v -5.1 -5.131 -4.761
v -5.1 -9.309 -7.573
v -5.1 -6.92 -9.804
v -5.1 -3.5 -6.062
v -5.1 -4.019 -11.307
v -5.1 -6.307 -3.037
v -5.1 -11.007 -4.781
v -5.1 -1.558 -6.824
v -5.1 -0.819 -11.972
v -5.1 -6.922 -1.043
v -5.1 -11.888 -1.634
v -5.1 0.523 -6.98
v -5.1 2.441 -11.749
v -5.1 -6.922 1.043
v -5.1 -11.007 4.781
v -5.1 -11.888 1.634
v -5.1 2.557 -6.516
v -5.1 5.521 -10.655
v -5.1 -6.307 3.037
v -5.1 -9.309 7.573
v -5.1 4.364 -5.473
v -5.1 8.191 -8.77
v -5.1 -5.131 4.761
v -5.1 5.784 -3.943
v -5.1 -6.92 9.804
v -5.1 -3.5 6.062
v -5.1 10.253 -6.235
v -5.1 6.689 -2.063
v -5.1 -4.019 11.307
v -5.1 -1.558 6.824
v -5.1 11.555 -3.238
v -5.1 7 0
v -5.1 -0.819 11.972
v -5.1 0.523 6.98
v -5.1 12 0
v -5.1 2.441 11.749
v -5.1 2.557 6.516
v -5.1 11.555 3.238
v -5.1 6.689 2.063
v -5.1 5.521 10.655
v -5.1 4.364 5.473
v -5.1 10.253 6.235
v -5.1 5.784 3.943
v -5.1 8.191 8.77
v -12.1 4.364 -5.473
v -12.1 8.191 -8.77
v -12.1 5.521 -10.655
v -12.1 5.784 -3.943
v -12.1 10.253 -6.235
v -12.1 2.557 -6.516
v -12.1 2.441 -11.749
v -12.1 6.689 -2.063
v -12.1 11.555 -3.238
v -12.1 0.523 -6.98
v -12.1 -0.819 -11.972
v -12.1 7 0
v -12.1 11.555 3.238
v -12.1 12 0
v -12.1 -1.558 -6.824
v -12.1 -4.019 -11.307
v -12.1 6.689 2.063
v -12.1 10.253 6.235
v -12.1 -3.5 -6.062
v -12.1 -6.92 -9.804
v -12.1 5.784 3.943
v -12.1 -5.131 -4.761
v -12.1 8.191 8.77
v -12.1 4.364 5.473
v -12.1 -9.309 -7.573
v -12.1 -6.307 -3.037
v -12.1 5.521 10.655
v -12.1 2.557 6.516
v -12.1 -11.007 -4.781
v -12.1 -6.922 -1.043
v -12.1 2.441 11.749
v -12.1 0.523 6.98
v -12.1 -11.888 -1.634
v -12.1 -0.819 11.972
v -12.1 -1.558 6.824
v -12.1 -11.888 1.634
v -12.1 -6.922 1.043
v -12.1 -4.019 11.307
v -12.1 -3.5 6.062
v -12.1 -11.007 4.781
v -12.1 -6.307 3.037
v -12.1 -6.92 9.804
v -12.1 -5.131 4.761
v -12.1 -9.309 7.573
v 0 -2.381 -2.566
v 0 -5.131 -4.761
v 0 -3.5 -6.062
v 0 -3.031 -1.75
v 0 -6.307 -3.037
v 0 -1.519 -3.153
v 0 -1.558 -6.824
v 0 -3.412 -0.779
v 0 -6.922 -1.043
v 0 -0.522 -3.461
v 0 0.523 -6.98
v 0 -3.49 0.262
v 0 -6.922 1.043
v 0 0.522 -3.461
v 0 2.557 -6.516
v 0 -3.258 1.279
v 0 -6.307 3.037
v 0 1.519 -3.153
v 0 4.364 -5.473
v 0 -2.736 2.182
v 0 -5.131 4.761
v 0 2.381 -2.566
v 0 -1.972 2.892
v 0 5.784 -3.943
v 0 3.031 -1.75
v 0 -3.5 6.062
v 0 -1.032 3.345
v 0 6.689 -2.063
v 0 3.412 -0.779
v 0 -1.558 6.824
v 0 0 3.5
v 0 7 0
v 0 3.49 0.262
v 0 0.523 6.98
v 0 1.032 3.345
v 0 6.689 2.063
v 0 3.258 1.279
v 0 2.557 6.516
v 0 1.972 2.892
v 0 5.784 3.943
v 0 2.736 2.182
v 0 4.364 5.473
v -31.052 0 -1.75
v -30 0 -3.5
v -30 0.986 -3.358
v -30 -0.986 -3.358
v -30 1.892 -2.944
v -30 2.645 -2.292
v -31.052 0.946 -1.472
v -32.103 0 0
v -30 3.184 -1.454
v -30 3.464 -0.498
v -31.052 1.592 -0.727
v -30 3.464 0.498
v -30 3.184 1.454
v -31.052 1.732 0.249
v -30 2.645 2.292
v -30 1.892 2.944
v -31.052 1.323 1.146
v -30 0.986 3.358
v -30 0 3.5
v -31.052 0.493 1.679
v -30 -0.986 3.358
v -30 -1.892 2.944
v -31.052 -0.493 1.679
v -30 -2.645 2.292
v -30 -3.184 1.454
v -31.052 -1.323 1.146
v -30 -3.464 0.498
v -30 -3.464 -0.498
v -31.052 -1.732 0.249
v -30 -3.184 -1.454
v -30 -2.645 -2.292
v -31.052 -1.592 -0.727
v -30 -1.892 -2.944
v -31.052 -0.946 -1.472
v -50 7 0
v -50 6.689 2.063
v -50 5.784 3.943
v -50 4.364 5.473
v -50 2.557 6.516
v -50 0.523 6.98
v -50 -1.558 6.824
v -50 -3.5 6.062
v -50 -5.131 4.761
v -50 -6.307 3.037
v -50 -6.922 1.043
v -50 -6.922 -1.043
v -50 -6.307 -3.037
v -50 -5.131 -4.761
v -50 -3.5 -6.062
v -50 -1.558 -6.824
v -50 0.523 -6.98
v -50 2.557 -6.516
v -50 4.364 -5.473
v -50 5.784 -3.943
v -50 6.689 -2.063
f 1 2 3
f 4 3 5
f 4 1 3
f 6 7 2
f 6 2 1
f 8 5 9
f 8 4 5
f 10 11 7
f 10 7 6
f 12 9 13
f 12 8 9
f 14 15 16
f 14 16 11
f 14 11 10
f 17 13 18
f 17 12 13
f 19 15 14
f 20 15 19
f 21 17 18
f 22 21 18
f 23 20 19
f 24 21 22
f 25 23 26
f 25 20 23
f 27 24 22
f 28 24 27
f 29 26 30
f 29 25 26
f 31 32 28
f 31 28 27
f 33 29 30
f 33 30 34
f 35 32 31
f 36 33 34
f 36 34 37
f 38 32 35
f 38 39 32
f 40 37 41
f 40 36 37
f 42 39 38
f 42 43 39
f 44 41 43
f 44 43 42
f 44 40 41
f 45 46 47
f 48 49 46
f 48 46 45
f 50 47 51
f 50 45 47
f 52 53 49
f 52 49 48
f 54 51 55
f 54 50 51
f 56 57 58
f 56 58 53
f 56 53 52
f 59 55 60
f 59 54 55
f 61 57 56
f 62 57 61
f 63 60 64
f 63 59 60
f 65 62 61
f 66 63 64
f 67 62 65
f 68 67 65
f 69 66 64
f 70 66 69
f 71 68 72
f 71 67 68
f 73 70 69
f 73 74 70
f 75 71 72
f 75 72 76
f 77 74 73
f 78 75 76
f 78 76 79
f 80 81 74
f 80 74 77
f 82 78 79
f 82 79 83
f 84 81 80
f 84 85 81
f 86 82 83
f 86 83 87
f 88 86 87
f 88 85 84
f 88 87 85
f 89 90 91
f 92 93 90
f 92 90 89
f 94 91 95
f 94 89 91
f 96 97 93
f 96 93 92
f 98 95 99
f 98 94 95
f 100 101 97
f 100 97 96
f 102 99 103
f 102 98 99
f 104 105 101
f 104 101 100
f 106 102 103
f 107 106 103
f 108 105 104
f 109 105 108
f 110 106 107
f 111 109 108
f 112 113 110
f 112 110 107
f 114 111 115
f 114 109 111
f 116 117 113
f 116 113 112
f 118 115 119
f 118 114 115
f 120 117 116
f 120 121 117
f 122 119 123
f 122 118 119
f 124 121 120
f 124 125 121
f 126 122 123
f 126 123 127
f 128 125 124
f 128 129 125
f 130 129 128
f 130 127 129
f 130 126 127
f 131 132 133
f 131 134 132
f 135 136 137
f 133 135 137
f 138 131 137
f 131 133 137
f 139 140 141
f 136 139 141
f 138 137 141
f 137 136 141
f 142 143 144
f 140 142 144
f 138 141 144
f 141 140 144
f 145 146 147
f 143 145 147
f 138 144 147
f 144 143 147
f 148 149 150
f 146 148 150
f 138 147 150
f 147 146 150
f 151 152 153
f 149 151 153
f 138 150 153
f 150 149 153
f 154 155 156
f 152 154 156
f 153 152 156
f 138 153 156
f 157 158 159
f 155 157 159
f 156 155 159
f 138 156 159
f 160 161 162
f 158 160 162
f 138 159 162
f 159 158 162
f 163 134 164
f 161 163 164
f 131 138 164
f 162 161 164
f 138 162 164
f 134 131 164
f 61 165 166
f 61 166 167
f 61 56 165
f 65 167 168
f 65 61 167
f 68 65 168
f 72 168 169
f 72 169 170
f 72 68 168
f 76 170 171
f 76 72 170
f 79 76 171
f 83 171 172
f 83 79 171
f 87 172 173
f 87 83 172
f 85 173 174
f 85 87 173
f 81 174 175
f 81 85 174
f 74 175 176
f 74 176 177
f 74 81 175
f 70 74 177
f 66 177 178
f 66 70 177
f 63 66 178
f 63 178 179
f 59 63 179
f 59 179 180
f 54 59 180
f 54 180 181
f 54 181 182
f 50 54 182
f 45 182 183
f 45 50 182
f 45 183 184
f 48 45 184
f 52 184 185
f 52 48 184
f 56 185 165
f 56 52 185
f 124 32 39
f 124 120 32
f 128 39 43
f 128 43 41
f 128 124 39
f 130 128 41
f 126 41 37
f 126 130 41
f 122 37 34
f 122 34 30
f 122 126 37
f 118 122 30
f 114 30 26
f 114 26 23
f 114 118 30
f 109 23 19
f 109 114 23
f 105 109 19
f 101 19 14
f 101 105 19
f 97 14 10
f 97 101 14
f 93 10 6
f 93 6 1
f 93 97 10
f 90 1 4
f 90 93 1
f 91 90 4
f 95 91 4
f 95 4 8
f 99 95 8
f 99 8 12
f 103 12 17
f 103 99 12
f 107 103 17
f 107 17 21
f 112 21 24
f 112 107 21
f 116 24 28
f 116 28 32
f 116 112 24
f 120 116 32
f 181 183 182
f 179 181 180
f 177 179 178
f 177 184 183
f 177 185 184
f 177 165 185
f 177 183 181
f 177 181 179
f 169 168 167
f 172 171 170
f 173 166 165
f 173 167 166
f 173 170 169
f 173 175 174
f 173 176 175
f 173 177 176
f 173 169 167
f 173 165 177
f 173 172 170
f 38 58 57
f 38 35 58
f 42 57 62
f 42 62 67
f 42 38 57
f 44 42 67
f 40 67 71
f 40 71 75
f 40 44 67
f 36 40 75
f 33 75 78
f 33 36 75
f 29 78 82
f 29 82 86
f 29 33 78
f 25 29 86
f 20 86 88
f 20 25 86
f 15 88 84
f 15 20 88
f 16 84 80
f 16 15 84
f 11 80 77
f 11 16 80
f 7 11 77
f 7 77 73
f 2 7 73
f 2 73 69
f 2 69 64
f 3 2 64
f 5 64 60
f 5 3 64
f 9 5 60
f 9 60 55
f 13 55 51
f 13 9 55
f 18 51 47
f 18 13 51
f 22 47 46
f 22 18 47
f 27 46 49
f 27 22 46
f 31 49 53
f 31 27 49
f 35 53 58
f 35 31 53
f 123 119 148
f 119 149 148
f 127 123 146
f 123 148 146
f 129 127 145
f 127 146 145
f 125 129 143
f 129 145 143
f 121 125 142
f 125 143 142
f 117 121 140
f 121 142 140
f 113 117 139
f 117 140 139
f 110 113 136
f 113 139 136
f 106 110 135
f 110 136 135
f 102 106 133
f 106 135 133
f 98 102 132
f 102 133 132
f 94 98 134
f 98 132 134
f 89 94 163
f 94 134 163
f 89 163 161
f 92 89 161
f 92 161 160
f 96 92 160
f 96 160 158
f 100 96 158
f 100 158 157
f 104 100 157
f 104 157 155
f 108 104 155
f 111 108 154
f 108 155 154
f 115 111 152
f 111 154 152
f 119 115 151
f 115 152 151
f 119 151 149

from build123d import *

# Parameters (mm, degrees)
TROU_TARAUD_M8X1_01_D     = 7
TROU_TARAUD_M8X1_01_DEPTH = 30
TROU_TARAUD_M8X1_01_TIP   = 2.103012167


with BuildPart() as part:
    # Sketch1 → Revolve1 (revolve)
    with BuildSketch(Plane.XY):
        Polygon((-5.1, 12), (-5.1, 7), (0, 7), (0, 0), (-50, 0), (-50, 7), (-12.1, 7), (-12.1, 12), align=None)
    revolve(axis=Axis((-78.343949045, 0, 0), (1, 0, 0)))

    # Trou taraudé M8x1.01
    with Locations(Plane(origin=(0, 0, 0), x_dir=(0, 0, -1), z_dir=(1, 0, 0))):
        with Locations((0, 0)):
            Hole(TROU_TARAUD_M8X1_01_D / 2, depth=TROU_TARAUD_M8X1_01_DEPTH)
            with Locations((0, 0, -(TROU_TARAUD_M8X1_01_DEPTH + TROU_TARAUD_M8X1_01_TIP / 2))):  # 118° drill point
                Cone(0, TROU_TARAUD_M8X1_01_D / 2, TROU_TARAUD_M8X1_01_TIP, mode=Mode.SUBTRACT)


solid = part.part
